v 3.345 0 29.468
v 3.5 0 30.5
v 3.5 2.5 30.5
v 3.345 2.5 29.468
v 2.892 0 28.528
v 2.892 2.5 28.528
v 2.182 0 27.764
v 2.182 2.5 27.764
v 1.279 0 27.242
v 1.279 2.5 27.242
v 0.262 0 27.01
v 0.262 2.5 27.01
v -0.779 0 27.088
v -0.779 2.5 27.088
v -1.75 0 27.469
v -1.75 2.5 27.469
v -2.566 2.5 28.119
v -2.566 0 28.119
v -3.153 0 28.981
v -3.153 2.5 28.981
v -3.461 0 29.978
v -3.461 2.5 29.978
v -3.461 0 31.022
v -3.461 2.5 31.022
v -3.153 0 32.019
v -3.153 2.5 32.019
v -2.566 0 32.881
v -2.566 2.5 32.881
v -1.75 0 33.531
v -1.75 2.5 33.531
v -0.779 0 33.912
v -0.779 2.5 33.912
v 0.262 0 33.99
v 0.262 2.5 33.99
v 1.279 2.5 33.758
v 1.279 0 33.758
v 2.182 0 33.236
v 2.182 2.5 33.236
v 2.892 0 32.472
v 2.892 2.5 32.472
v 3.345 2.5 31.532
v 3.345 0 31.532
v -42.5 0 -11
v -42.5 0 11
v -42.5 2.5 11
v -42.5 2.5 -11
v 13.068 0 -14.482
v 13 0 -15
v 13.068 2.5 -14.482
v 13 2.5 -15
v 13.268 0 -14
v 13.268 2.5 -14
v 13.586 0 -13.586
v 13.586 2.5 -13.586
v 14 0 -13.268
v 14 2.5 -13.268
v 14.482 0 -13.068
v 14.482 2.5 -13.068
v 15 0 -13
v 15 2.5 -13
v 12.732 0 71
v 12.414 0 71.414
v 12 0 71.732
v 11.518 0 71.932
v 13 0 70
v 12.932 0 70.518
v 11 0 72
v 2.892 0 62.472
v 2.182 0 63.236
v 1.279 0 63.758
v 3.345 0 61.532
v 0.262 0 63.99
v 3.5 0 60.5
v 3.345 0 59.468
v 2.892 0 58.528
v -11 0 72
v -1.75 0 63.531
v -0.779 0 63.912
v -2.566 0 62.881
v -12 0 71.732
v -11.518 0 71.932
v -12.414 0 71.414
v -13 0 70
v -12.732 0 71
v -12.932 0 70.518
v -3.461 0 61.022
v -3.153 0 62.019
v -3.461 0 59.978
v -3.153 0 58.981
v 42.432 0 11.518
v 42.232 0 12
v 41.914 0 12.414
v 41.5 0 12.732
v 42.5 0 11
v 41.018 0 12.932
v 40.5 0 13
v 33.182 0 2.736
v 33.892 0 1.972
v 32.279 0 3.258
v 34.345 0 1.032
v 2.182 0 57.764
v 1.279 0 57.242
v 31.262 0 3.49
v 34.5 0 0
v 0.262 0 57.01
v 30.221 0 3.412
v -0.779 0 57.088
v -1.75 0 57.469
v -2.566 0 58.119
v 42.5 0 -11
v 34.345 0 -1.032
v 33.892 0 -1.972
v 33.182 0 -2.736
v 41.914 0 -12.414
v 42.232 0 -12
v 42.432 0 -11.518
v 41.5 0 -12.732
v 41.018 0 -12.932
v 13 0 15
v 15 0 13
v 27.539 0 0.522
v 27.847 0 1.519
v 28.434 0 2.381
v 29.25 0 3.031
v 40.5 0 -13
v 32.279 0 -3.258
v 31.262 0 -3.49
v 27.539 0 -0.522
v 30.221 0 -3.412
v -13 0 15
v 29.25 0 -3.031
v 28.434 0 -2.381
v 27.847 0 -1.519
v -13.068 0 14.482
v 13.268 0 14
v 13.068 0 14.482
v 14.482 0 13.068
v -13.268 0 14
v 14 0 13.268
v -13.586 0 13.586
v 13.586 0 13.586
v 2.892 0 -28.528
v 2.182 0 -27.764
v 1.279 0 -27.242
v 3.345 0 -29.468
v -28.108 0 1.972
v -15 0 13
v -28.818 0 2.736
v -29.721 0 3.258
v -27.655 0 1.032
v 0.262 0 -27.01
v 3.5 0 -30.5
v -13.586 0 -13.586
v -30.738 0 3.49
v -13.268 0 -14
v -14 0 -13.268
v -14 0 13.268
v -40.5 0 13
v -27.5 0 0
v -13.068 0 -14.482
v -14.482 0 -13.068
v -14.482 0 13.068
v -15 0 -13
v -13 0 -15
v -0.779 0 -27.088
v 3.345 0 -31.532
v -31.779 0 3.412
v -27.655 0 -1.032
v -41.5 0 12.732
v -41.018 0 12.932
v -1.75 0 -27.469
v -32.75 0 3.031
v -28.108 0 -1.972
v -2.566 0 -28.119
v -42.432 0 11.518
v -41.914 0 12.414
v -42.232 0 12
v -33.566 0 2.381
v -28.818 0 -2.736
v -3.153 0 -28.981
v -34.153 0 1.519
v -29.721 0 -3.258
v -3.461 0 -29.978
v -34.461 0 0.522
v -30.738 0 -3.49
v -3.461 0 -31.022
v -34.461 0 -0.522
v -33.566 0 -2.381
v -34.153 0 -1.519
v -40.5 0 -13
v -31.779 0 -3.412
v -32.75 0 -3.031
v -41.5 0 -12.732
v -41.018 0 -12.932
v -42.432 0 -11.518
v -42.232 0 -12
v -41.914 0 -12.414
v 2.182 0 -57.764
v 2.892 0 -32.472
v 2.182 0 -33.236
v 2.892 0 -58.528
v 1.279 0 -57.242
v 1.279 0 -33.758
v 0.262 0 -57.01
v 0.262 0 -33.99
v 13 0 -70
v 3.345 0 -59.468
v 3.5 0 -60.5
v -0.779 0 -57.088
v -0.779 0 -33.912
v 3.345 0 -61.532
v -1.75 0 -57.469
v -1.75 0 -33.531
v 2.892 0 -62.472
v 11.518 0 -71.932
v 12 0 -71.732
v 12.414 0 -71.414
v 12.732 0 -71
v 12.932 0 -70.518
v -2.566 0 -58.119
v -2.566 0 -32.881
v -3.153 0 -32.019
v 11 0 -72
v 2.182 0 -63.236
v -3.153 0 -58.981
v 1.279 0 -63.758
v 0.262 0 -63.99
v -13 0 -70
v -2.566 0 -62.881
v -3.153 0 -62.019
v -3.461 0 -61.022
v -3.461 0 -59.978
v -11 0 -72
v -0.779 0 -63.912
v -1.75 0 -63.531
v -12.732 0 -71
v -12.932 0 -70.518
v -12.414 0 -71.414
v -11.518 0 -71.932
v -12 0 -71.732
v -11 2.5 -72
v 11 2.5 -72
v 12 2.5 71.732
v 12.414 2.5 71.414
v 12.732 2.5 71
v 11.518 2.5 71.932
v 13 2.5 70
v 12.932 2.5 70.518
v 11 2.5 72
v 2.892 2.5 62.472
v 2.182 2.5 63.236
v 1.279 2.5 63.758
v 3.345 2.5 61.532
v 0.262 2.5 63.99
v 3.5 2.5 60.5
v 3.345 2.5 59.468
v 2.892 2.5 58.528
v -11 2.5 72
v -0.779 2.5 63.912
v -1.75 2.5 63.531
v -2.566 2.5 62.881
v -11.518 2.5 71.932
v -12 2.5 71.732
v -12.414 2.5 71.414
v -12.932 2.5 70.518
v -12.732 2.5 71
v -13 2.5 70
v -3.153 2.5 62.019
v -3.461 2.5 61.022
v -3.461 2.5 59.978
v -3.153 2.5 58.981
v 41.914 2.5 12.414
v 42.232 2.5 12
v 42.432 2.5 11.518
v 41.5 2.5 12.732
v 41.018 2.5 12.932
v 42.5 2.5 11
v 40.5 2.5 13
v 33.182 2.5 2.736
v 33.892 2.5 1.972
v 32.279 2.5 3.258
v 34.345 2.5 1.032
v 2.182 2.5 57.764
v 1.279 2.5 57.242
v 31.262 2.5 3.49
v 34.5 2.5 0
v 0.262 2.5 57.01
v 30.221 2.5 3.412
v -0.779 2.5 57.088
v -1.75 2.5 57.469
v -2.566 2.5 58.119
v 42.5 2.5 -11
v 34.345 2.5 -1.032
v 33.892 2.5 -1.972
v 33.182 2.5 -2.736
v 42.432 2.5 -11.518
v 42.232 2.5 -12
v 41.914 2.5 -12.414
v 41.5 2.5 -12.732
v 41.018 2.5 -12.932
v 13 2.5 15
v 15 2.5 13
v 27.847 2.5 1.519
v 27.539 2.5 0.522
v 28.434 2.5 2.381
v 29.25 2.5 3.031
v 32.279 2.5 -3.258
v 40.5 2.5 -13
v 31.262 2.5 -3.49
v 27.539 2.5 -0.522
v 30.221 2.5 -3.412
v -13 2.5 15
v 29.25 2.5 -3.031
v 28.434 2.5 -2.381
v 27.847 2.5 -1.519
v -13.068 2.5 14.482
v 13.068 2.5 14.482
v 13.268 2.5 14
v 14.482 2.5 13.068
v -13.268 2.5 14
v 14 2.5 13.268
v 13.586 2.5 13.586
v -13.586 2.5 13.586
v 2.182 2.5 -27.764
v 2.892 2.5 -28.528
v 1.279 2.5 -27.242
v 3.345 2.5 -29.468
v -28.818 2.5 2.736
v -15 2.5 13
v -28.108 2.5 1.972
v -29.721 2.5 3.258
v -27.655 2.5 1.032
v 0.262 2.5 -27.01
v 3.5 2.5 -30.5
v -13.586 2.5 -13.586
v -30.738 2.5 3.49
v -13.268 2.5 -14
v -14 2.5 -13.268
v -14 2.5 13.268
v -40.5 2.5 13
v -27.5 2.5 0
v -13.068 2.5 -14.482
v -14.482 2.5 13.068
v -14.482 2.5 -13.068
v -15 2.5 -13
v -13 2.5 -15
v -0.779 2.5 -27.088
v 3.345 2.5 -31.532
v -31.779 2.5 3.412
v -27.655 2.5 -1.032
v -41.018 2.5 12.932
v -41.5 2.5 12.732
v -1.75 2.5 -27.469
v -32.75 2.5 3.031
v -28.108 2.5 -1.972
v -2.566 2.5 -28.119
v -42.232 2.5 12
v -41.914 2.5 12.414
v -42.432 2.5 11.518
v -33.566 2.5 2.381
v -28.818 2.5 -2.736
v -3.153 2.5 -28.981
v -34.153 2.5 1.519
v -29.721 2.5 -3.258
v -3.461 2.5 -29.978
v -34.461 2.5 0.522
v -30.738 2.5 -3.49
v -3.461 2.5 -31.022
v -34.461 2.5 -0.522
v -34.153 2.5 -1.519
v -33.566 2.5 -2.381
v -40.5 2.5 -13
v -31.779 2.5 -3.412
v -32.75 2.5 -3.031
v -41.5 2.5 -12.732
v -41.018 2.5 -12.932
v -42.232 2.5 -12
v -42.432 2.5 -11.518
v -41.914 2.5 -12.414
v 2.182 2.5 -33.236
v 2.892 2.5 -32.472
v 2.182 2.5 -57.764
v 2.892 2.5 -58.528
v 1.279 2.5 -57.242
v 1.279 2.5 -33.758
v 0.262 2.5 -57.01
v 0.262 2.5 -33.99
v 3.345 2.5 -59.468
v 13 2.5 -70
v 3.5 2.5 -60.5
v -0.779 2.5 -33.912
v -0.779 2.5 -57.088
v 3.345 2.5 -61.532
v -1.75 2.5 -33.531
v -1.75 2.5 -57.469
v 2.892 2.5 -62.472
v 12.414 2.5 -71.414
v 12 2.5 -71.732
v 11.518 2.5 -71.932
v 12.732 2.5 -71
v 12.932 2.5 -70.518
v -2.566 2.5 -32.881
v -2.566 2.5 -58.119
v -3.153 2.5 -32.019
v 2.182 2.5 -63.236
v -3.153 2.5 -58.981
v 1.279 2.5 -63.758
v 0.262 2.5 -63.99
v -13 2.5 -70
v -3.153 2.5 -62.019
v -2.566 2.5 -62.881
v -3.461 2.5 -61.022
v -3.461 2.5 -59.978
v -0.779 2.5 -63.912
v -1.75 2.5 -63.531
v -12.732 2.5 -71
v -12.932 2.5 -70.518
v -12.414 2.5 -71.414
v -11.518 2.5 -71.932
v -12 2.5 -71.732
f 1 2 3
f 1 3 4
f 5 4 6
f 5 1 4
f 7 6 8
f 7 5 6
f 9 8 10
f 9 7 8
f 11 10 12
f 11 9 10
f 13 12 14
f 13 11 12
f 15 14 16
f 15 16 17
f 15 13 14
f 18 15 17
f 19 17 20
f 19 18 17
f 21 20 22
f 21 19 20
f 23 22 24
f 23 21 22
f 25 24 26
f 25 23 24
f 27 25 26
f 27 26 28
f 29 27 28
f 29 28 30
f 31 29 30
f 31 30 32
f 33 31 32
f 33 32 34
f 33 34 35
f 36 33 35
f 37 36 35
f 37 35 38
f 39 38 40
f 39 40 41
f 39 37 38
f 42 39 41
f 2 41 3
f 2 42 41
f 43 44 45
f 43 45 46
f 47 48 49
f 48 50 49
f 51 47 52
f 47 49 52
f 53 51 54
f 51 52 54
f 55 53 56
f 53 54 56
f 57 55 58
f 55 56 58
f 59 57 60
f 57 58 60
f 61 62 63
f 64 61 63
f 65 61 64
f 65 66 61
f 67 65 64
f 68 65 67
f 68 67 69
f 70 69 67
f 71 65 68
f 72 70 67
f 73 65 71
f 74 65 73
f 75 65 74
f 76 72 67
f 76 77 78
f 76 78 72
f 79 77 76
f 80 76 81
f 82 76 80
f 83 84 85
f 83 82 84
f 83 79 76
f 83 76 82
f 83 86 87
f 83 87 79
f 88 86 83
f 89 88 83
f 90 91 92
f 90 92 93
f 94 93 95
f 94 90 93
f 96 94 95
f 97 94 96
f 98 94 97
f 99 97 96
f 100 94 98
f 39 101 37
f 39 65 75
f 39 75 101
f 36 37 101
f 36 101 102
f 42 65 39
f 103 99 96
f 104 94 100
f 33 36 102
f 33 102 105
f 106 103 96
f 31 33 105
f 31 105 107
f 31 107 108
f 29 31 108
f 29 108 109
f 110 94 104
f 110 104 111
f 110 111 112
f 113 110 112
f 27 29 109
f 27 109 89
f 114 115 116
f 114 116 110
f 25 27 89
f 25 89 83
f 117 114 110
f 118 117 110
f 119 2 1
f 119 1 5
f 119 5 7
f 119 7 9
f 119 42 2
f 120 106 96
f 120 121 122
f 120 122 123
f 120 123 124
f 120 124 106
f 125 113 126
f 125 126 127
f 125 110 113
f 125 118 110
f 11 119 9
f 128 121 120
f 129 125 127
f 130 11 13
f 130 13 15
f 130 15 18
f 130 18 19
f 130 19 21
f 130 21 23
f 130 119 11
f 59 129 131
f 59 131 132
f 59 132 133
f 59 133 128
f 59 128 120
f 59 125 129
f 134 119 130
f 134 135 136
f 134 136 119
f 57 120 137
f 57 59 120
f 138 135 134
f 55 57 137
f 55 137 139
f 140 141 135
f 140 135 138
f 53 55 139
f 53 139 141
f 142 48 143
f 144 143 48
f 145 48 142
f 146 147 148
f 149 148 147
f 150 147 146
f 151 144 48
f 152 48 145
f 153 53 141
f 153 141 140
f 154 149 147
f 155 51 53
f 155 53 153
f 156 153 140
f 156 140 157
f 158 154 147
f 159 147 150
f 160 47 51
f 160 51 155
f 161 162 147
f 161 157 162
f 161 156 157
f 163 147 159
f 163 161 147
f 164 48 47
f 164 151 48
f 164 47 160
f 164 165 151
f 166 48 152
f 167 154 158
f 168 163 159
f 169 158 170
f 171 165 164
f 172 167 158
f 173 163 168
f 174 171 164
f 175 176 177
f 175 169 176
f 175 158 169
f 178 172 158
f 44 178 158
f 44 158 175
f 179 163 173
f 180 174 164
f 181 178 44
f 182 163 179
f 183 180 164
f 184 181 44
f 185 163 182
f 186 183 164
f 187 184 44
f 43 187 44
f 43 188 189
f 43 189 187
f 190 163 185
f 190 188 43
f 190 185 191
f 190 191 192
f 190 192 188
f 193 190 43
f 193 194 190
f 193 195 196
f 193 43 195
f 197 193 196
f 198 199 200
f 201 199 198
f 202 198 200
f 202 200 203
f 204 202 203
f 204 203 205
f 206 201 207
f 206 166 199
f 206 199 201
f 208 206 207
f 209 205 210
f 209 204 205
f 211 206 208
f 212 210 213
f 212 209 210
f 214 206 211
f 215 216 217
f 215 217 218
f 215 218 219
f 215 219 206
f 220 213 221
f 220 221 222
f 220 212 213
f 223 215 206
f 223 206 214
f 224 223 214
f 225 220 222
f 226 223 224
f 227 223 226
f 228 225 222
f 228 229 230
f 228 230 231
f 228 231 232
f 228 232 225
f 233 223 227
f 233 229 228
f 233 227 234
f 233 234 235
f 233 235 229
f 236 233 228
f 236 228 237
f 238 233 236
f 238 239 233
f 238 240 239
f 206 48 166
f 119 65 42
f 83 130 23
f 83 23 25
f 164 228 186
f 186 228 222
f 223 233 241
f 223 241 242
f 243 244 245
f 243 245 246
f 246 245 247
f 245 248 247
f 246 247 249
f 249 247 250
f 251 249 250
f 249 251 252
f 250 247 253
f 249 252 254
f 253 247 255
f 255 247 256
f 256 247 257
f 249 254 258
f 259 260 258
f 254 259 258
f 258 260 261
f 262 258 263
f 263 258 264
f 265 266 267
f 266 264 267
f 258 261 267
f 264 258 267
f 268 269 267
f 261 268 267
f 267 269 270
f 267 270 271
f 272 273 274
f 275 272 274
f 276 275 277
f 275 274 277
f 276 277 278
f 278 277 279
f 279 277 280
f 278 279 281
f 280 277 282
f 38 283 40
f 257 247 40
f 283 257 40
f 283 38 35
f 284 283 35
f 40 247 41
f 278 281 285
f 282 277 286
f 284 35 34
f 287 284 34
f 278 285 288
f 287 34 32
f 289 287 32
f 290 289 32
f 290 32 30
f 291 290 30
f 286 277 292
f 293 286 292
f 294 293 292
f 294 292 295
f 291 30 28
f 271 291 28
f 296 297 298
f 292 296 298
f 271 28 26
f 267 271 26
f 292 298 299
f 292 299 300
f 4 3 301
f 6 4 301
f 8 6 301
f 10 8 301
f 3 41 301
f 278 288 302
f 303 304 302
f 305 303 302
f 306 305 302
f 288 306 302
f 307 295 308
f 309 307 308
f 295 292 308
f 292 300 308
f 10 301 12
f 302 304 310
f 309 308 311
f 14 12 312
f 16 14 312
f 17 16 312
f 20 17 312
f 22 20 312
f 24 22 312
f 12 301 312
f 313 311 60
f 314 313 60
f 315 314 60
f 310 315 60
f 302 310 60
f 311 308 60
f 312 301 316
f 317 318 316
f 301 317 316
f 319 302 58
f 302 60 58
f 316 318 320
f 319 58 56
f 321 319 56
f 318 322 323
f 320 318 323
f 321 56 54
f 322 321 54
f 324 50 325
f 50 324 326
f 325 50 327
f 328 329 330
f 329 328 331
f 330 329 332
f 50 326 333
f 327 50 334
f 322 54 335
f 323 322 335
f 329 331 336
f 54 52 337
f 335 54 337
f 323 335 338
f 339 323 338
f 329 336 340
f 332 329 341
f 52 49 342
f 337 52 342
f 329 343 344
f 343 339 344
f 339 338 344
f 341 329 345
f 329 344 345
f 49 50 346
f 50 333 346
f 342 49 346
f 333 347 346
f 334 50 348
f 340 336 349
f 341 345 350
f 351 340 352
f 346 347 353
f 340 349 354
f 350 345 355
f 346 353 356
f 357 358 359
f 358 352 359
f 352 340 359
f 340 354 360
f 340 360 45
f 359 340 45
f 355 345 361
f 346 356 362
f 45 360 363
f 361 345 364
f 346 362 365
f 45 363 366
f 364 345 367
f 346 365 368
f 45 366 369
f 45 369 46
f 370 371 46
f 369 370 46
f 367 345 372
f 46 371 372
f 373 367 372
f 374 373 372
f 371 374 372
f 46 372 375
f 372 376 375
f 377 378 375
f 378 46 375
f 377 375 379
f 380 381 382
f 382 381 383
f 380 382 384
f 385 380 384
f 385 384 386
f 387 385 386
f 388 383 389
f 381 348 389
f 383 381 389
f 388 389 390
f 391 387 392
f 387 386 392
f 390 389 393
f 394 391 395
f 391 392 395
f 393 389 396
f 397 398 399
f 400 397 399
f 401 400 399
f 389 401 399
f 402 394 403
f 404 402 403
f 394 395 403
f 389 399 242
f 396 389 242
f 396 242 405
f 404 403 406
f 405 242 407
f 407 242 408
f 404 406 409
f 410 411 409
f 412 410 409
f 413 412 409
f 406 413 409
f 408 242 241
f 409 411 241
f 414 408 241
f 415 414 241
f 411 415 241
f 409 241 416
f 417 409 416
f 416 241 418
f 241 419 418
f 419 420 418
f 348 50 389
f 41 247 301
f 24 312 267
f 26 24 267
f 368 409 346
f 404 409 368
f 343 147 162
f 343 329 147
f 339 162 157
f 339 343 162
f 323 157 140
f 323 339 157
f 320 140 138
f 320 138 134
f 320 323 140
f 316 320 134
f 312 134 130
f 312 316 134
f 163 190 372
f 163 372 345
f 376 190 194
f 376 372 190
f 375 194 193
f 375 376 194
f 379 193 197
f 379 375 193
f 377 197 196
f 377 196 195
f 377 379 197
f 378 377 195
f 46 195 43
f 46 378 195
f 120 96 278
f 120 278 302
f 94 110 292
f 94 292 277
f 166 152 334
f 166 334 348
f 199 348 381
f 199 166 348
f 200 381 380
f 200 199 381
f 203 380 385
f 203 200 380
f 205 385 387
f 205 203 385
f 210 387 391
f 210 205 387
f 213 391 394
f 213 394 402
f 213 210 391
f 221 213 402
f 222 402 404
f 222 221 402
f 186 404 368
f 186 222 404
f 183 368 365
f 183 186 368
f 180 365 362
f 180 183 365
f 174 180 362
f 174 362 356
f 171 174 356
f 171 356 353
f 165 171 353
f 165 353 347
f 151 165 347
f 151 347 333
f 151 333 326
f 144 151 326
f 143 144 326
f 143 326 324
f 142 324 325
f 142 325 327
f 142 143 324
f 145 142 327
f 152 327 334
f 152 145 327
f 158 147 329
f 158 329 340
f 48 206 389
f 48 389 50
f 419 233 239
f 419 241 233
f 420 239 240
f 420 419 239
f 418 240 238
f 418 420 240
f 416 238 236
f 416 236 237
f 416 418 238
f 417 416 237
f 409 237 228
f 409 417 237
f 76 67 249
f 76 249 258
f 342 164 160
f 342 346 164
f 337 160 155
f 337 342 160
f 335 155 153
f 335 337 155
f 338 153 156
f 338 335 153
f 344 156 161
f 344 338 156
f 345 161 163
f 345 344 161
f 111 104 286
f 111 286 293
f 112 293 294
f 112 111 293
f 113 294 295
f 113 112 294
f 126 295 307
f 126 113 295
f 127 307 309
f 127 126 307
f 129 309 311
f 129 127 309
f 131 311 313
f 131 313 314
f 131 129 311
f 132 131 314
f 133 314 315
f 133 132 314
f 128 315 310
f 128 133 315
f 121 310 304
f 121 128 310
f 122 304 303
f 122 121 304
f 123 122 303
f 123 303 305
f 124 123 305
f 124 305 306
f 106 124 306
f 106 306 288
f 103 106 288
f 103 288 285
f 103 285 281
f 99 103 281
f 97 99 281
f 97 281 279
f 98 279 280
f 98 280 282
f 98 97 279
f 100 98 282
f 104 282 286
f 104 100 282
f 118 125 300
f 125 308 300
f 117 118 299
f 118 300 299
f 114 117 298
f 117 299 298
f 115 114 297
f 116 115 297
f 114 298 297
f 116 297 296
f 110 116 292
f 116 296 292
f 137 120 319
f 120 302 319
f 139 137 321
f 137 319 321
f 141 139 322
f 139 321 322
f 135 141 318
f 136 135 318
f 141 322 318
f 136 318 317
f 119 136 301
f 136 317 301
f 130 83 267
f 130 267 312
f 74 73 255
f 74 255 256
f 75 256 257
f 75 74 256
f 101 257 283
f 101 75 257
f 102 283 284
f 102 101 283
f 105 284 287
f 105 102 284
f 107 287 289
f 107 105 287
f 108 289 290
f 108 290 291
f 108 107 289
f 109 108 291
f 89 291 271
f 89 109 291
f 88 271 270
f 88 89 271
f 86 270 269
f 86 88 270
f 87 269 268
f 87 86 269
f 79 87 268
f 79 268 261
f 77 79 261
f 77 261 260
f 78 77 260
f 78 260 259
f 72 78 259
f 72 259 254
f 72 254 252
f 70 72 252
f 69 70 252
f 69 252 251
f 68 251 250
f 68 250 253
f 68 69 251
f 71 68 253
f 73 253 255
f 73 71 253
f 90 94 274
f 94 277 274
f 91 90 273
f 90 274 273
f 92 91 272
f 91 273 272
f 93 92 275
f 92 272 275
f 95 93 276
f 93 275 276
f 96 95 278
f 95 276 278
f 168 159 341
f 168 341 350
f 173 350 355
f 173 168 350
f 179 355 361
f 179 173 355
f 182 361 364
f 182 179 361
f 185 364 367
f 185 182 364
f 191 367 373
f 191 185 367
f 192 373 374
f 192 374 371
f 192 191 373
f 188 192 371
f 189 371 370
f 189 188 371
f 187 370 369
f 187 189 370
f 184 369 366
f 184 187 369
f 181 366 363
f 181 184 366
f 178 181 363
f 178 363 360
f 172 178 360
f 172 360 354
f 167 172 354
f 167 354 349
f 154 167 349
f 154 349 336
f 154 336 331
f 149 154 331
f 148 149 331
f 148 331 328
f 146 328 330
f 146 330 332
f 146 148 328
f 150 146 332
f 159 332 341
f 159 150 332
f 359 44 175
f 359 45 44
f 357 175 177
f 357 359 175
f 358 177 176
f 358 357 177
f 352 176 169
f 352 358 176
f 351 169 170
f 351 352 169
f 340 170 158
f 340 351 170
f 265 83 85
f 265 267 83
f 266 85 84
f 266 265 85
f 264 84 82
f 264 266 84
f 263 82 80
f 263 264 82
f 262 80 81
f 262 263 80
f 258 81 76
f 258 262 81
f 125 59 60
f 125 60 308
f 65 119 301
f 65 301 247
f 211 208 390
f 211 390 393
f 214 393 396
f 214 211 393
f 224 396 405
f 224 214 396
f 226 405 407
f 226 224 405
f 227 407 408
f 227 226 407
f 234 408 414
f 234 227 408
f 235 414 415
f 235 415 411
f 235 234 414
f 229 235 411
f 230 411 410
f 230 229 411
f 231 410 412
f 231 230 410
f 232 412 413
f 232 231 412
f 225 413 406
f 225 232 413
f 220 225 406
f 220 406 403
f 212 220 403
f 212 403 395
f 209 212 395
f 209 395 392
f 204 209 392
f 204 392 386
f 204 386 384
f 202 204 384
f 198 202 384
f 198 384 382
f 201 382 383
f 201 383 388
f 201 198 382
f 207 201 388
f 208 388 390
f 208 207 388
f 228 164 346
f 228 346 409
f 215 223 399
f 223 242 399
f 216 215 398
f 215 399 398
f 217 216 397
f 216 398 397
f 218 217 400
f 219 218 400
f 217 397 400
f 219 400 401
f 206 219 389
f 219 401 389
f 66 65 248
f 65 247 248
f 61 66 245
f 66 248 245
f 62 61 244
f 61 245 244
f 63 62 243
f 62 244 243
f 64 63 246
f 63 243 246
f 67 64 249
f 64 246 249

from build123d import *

# Parameters (mm, degrees)
SKETCH_1_R      = 3.5
EXTRUDE_1_DEPTH = 2.5
FILLET_1_R      = 2


with BuildPart() as part:
    # 草图1 → 凸台-拉伸1 (new body)
    with BuildSketch(Plane(origin=(0, 0, 0), x_dir=(1, 0, 0), z_dir=(0, 1, 0))):
        Polygon((-13, 72), (13, 72), (13, 13), (42.5, 13), (42.5, -13), (13, -13), (13, -72), (-13, -72), (-13, -13), (-42.5, -13), (-42.5, 13), (-13, 13), align=None)
        with Locations((0, -60.5)):
            Circle(SKETCH_1_R, mode=Mode.SUBTRACT)
        with Locations((0, -30.5)):
            Circle(SKETCH_1_R, mode=Mode.SUBTRACT)
        with Locations((-31, 0)):
            Circle(SKETCH_1_R, mode=Mode.SUBTRACT)
        with Locations((31, 0)):
            Circle(SKETCH_1_R, mode=Mode.SUBTRACT)
        with Locations((0, 60.5)):
            Circle(SKETCH_1_R, mode=Mode.SUBTRACT)
        with Locations((0, 30.5)):
            Circle(SKETCH_1_R, mode=Mode.SUBTRACT)
    extrude(amount=EXTRUDE_1_DEPTH)

    # 圆角1
    fillet_1_edges = [part.edges().sort_by_distance(p)[0] for p in [
        (13, 1.25, 72),
        (-13, 1.25, 72),
        (-13, 1.25, 13),
        (-42.5, 1.25, 13),
        (-42.5, 1.25, -13),
        (-13, 1.25, -13),
        (-13, 1.25, -72),
        (13, 1.25, -72),
        (13, 1.25, -13),
        (42.5, 1.25, -13),
        (42.5, 1.25, 13),
        (13, 1.25, 13),
    ]]
    fillet(fillet_1_edges, radius=FILLET_1_R)


solid = part.part
